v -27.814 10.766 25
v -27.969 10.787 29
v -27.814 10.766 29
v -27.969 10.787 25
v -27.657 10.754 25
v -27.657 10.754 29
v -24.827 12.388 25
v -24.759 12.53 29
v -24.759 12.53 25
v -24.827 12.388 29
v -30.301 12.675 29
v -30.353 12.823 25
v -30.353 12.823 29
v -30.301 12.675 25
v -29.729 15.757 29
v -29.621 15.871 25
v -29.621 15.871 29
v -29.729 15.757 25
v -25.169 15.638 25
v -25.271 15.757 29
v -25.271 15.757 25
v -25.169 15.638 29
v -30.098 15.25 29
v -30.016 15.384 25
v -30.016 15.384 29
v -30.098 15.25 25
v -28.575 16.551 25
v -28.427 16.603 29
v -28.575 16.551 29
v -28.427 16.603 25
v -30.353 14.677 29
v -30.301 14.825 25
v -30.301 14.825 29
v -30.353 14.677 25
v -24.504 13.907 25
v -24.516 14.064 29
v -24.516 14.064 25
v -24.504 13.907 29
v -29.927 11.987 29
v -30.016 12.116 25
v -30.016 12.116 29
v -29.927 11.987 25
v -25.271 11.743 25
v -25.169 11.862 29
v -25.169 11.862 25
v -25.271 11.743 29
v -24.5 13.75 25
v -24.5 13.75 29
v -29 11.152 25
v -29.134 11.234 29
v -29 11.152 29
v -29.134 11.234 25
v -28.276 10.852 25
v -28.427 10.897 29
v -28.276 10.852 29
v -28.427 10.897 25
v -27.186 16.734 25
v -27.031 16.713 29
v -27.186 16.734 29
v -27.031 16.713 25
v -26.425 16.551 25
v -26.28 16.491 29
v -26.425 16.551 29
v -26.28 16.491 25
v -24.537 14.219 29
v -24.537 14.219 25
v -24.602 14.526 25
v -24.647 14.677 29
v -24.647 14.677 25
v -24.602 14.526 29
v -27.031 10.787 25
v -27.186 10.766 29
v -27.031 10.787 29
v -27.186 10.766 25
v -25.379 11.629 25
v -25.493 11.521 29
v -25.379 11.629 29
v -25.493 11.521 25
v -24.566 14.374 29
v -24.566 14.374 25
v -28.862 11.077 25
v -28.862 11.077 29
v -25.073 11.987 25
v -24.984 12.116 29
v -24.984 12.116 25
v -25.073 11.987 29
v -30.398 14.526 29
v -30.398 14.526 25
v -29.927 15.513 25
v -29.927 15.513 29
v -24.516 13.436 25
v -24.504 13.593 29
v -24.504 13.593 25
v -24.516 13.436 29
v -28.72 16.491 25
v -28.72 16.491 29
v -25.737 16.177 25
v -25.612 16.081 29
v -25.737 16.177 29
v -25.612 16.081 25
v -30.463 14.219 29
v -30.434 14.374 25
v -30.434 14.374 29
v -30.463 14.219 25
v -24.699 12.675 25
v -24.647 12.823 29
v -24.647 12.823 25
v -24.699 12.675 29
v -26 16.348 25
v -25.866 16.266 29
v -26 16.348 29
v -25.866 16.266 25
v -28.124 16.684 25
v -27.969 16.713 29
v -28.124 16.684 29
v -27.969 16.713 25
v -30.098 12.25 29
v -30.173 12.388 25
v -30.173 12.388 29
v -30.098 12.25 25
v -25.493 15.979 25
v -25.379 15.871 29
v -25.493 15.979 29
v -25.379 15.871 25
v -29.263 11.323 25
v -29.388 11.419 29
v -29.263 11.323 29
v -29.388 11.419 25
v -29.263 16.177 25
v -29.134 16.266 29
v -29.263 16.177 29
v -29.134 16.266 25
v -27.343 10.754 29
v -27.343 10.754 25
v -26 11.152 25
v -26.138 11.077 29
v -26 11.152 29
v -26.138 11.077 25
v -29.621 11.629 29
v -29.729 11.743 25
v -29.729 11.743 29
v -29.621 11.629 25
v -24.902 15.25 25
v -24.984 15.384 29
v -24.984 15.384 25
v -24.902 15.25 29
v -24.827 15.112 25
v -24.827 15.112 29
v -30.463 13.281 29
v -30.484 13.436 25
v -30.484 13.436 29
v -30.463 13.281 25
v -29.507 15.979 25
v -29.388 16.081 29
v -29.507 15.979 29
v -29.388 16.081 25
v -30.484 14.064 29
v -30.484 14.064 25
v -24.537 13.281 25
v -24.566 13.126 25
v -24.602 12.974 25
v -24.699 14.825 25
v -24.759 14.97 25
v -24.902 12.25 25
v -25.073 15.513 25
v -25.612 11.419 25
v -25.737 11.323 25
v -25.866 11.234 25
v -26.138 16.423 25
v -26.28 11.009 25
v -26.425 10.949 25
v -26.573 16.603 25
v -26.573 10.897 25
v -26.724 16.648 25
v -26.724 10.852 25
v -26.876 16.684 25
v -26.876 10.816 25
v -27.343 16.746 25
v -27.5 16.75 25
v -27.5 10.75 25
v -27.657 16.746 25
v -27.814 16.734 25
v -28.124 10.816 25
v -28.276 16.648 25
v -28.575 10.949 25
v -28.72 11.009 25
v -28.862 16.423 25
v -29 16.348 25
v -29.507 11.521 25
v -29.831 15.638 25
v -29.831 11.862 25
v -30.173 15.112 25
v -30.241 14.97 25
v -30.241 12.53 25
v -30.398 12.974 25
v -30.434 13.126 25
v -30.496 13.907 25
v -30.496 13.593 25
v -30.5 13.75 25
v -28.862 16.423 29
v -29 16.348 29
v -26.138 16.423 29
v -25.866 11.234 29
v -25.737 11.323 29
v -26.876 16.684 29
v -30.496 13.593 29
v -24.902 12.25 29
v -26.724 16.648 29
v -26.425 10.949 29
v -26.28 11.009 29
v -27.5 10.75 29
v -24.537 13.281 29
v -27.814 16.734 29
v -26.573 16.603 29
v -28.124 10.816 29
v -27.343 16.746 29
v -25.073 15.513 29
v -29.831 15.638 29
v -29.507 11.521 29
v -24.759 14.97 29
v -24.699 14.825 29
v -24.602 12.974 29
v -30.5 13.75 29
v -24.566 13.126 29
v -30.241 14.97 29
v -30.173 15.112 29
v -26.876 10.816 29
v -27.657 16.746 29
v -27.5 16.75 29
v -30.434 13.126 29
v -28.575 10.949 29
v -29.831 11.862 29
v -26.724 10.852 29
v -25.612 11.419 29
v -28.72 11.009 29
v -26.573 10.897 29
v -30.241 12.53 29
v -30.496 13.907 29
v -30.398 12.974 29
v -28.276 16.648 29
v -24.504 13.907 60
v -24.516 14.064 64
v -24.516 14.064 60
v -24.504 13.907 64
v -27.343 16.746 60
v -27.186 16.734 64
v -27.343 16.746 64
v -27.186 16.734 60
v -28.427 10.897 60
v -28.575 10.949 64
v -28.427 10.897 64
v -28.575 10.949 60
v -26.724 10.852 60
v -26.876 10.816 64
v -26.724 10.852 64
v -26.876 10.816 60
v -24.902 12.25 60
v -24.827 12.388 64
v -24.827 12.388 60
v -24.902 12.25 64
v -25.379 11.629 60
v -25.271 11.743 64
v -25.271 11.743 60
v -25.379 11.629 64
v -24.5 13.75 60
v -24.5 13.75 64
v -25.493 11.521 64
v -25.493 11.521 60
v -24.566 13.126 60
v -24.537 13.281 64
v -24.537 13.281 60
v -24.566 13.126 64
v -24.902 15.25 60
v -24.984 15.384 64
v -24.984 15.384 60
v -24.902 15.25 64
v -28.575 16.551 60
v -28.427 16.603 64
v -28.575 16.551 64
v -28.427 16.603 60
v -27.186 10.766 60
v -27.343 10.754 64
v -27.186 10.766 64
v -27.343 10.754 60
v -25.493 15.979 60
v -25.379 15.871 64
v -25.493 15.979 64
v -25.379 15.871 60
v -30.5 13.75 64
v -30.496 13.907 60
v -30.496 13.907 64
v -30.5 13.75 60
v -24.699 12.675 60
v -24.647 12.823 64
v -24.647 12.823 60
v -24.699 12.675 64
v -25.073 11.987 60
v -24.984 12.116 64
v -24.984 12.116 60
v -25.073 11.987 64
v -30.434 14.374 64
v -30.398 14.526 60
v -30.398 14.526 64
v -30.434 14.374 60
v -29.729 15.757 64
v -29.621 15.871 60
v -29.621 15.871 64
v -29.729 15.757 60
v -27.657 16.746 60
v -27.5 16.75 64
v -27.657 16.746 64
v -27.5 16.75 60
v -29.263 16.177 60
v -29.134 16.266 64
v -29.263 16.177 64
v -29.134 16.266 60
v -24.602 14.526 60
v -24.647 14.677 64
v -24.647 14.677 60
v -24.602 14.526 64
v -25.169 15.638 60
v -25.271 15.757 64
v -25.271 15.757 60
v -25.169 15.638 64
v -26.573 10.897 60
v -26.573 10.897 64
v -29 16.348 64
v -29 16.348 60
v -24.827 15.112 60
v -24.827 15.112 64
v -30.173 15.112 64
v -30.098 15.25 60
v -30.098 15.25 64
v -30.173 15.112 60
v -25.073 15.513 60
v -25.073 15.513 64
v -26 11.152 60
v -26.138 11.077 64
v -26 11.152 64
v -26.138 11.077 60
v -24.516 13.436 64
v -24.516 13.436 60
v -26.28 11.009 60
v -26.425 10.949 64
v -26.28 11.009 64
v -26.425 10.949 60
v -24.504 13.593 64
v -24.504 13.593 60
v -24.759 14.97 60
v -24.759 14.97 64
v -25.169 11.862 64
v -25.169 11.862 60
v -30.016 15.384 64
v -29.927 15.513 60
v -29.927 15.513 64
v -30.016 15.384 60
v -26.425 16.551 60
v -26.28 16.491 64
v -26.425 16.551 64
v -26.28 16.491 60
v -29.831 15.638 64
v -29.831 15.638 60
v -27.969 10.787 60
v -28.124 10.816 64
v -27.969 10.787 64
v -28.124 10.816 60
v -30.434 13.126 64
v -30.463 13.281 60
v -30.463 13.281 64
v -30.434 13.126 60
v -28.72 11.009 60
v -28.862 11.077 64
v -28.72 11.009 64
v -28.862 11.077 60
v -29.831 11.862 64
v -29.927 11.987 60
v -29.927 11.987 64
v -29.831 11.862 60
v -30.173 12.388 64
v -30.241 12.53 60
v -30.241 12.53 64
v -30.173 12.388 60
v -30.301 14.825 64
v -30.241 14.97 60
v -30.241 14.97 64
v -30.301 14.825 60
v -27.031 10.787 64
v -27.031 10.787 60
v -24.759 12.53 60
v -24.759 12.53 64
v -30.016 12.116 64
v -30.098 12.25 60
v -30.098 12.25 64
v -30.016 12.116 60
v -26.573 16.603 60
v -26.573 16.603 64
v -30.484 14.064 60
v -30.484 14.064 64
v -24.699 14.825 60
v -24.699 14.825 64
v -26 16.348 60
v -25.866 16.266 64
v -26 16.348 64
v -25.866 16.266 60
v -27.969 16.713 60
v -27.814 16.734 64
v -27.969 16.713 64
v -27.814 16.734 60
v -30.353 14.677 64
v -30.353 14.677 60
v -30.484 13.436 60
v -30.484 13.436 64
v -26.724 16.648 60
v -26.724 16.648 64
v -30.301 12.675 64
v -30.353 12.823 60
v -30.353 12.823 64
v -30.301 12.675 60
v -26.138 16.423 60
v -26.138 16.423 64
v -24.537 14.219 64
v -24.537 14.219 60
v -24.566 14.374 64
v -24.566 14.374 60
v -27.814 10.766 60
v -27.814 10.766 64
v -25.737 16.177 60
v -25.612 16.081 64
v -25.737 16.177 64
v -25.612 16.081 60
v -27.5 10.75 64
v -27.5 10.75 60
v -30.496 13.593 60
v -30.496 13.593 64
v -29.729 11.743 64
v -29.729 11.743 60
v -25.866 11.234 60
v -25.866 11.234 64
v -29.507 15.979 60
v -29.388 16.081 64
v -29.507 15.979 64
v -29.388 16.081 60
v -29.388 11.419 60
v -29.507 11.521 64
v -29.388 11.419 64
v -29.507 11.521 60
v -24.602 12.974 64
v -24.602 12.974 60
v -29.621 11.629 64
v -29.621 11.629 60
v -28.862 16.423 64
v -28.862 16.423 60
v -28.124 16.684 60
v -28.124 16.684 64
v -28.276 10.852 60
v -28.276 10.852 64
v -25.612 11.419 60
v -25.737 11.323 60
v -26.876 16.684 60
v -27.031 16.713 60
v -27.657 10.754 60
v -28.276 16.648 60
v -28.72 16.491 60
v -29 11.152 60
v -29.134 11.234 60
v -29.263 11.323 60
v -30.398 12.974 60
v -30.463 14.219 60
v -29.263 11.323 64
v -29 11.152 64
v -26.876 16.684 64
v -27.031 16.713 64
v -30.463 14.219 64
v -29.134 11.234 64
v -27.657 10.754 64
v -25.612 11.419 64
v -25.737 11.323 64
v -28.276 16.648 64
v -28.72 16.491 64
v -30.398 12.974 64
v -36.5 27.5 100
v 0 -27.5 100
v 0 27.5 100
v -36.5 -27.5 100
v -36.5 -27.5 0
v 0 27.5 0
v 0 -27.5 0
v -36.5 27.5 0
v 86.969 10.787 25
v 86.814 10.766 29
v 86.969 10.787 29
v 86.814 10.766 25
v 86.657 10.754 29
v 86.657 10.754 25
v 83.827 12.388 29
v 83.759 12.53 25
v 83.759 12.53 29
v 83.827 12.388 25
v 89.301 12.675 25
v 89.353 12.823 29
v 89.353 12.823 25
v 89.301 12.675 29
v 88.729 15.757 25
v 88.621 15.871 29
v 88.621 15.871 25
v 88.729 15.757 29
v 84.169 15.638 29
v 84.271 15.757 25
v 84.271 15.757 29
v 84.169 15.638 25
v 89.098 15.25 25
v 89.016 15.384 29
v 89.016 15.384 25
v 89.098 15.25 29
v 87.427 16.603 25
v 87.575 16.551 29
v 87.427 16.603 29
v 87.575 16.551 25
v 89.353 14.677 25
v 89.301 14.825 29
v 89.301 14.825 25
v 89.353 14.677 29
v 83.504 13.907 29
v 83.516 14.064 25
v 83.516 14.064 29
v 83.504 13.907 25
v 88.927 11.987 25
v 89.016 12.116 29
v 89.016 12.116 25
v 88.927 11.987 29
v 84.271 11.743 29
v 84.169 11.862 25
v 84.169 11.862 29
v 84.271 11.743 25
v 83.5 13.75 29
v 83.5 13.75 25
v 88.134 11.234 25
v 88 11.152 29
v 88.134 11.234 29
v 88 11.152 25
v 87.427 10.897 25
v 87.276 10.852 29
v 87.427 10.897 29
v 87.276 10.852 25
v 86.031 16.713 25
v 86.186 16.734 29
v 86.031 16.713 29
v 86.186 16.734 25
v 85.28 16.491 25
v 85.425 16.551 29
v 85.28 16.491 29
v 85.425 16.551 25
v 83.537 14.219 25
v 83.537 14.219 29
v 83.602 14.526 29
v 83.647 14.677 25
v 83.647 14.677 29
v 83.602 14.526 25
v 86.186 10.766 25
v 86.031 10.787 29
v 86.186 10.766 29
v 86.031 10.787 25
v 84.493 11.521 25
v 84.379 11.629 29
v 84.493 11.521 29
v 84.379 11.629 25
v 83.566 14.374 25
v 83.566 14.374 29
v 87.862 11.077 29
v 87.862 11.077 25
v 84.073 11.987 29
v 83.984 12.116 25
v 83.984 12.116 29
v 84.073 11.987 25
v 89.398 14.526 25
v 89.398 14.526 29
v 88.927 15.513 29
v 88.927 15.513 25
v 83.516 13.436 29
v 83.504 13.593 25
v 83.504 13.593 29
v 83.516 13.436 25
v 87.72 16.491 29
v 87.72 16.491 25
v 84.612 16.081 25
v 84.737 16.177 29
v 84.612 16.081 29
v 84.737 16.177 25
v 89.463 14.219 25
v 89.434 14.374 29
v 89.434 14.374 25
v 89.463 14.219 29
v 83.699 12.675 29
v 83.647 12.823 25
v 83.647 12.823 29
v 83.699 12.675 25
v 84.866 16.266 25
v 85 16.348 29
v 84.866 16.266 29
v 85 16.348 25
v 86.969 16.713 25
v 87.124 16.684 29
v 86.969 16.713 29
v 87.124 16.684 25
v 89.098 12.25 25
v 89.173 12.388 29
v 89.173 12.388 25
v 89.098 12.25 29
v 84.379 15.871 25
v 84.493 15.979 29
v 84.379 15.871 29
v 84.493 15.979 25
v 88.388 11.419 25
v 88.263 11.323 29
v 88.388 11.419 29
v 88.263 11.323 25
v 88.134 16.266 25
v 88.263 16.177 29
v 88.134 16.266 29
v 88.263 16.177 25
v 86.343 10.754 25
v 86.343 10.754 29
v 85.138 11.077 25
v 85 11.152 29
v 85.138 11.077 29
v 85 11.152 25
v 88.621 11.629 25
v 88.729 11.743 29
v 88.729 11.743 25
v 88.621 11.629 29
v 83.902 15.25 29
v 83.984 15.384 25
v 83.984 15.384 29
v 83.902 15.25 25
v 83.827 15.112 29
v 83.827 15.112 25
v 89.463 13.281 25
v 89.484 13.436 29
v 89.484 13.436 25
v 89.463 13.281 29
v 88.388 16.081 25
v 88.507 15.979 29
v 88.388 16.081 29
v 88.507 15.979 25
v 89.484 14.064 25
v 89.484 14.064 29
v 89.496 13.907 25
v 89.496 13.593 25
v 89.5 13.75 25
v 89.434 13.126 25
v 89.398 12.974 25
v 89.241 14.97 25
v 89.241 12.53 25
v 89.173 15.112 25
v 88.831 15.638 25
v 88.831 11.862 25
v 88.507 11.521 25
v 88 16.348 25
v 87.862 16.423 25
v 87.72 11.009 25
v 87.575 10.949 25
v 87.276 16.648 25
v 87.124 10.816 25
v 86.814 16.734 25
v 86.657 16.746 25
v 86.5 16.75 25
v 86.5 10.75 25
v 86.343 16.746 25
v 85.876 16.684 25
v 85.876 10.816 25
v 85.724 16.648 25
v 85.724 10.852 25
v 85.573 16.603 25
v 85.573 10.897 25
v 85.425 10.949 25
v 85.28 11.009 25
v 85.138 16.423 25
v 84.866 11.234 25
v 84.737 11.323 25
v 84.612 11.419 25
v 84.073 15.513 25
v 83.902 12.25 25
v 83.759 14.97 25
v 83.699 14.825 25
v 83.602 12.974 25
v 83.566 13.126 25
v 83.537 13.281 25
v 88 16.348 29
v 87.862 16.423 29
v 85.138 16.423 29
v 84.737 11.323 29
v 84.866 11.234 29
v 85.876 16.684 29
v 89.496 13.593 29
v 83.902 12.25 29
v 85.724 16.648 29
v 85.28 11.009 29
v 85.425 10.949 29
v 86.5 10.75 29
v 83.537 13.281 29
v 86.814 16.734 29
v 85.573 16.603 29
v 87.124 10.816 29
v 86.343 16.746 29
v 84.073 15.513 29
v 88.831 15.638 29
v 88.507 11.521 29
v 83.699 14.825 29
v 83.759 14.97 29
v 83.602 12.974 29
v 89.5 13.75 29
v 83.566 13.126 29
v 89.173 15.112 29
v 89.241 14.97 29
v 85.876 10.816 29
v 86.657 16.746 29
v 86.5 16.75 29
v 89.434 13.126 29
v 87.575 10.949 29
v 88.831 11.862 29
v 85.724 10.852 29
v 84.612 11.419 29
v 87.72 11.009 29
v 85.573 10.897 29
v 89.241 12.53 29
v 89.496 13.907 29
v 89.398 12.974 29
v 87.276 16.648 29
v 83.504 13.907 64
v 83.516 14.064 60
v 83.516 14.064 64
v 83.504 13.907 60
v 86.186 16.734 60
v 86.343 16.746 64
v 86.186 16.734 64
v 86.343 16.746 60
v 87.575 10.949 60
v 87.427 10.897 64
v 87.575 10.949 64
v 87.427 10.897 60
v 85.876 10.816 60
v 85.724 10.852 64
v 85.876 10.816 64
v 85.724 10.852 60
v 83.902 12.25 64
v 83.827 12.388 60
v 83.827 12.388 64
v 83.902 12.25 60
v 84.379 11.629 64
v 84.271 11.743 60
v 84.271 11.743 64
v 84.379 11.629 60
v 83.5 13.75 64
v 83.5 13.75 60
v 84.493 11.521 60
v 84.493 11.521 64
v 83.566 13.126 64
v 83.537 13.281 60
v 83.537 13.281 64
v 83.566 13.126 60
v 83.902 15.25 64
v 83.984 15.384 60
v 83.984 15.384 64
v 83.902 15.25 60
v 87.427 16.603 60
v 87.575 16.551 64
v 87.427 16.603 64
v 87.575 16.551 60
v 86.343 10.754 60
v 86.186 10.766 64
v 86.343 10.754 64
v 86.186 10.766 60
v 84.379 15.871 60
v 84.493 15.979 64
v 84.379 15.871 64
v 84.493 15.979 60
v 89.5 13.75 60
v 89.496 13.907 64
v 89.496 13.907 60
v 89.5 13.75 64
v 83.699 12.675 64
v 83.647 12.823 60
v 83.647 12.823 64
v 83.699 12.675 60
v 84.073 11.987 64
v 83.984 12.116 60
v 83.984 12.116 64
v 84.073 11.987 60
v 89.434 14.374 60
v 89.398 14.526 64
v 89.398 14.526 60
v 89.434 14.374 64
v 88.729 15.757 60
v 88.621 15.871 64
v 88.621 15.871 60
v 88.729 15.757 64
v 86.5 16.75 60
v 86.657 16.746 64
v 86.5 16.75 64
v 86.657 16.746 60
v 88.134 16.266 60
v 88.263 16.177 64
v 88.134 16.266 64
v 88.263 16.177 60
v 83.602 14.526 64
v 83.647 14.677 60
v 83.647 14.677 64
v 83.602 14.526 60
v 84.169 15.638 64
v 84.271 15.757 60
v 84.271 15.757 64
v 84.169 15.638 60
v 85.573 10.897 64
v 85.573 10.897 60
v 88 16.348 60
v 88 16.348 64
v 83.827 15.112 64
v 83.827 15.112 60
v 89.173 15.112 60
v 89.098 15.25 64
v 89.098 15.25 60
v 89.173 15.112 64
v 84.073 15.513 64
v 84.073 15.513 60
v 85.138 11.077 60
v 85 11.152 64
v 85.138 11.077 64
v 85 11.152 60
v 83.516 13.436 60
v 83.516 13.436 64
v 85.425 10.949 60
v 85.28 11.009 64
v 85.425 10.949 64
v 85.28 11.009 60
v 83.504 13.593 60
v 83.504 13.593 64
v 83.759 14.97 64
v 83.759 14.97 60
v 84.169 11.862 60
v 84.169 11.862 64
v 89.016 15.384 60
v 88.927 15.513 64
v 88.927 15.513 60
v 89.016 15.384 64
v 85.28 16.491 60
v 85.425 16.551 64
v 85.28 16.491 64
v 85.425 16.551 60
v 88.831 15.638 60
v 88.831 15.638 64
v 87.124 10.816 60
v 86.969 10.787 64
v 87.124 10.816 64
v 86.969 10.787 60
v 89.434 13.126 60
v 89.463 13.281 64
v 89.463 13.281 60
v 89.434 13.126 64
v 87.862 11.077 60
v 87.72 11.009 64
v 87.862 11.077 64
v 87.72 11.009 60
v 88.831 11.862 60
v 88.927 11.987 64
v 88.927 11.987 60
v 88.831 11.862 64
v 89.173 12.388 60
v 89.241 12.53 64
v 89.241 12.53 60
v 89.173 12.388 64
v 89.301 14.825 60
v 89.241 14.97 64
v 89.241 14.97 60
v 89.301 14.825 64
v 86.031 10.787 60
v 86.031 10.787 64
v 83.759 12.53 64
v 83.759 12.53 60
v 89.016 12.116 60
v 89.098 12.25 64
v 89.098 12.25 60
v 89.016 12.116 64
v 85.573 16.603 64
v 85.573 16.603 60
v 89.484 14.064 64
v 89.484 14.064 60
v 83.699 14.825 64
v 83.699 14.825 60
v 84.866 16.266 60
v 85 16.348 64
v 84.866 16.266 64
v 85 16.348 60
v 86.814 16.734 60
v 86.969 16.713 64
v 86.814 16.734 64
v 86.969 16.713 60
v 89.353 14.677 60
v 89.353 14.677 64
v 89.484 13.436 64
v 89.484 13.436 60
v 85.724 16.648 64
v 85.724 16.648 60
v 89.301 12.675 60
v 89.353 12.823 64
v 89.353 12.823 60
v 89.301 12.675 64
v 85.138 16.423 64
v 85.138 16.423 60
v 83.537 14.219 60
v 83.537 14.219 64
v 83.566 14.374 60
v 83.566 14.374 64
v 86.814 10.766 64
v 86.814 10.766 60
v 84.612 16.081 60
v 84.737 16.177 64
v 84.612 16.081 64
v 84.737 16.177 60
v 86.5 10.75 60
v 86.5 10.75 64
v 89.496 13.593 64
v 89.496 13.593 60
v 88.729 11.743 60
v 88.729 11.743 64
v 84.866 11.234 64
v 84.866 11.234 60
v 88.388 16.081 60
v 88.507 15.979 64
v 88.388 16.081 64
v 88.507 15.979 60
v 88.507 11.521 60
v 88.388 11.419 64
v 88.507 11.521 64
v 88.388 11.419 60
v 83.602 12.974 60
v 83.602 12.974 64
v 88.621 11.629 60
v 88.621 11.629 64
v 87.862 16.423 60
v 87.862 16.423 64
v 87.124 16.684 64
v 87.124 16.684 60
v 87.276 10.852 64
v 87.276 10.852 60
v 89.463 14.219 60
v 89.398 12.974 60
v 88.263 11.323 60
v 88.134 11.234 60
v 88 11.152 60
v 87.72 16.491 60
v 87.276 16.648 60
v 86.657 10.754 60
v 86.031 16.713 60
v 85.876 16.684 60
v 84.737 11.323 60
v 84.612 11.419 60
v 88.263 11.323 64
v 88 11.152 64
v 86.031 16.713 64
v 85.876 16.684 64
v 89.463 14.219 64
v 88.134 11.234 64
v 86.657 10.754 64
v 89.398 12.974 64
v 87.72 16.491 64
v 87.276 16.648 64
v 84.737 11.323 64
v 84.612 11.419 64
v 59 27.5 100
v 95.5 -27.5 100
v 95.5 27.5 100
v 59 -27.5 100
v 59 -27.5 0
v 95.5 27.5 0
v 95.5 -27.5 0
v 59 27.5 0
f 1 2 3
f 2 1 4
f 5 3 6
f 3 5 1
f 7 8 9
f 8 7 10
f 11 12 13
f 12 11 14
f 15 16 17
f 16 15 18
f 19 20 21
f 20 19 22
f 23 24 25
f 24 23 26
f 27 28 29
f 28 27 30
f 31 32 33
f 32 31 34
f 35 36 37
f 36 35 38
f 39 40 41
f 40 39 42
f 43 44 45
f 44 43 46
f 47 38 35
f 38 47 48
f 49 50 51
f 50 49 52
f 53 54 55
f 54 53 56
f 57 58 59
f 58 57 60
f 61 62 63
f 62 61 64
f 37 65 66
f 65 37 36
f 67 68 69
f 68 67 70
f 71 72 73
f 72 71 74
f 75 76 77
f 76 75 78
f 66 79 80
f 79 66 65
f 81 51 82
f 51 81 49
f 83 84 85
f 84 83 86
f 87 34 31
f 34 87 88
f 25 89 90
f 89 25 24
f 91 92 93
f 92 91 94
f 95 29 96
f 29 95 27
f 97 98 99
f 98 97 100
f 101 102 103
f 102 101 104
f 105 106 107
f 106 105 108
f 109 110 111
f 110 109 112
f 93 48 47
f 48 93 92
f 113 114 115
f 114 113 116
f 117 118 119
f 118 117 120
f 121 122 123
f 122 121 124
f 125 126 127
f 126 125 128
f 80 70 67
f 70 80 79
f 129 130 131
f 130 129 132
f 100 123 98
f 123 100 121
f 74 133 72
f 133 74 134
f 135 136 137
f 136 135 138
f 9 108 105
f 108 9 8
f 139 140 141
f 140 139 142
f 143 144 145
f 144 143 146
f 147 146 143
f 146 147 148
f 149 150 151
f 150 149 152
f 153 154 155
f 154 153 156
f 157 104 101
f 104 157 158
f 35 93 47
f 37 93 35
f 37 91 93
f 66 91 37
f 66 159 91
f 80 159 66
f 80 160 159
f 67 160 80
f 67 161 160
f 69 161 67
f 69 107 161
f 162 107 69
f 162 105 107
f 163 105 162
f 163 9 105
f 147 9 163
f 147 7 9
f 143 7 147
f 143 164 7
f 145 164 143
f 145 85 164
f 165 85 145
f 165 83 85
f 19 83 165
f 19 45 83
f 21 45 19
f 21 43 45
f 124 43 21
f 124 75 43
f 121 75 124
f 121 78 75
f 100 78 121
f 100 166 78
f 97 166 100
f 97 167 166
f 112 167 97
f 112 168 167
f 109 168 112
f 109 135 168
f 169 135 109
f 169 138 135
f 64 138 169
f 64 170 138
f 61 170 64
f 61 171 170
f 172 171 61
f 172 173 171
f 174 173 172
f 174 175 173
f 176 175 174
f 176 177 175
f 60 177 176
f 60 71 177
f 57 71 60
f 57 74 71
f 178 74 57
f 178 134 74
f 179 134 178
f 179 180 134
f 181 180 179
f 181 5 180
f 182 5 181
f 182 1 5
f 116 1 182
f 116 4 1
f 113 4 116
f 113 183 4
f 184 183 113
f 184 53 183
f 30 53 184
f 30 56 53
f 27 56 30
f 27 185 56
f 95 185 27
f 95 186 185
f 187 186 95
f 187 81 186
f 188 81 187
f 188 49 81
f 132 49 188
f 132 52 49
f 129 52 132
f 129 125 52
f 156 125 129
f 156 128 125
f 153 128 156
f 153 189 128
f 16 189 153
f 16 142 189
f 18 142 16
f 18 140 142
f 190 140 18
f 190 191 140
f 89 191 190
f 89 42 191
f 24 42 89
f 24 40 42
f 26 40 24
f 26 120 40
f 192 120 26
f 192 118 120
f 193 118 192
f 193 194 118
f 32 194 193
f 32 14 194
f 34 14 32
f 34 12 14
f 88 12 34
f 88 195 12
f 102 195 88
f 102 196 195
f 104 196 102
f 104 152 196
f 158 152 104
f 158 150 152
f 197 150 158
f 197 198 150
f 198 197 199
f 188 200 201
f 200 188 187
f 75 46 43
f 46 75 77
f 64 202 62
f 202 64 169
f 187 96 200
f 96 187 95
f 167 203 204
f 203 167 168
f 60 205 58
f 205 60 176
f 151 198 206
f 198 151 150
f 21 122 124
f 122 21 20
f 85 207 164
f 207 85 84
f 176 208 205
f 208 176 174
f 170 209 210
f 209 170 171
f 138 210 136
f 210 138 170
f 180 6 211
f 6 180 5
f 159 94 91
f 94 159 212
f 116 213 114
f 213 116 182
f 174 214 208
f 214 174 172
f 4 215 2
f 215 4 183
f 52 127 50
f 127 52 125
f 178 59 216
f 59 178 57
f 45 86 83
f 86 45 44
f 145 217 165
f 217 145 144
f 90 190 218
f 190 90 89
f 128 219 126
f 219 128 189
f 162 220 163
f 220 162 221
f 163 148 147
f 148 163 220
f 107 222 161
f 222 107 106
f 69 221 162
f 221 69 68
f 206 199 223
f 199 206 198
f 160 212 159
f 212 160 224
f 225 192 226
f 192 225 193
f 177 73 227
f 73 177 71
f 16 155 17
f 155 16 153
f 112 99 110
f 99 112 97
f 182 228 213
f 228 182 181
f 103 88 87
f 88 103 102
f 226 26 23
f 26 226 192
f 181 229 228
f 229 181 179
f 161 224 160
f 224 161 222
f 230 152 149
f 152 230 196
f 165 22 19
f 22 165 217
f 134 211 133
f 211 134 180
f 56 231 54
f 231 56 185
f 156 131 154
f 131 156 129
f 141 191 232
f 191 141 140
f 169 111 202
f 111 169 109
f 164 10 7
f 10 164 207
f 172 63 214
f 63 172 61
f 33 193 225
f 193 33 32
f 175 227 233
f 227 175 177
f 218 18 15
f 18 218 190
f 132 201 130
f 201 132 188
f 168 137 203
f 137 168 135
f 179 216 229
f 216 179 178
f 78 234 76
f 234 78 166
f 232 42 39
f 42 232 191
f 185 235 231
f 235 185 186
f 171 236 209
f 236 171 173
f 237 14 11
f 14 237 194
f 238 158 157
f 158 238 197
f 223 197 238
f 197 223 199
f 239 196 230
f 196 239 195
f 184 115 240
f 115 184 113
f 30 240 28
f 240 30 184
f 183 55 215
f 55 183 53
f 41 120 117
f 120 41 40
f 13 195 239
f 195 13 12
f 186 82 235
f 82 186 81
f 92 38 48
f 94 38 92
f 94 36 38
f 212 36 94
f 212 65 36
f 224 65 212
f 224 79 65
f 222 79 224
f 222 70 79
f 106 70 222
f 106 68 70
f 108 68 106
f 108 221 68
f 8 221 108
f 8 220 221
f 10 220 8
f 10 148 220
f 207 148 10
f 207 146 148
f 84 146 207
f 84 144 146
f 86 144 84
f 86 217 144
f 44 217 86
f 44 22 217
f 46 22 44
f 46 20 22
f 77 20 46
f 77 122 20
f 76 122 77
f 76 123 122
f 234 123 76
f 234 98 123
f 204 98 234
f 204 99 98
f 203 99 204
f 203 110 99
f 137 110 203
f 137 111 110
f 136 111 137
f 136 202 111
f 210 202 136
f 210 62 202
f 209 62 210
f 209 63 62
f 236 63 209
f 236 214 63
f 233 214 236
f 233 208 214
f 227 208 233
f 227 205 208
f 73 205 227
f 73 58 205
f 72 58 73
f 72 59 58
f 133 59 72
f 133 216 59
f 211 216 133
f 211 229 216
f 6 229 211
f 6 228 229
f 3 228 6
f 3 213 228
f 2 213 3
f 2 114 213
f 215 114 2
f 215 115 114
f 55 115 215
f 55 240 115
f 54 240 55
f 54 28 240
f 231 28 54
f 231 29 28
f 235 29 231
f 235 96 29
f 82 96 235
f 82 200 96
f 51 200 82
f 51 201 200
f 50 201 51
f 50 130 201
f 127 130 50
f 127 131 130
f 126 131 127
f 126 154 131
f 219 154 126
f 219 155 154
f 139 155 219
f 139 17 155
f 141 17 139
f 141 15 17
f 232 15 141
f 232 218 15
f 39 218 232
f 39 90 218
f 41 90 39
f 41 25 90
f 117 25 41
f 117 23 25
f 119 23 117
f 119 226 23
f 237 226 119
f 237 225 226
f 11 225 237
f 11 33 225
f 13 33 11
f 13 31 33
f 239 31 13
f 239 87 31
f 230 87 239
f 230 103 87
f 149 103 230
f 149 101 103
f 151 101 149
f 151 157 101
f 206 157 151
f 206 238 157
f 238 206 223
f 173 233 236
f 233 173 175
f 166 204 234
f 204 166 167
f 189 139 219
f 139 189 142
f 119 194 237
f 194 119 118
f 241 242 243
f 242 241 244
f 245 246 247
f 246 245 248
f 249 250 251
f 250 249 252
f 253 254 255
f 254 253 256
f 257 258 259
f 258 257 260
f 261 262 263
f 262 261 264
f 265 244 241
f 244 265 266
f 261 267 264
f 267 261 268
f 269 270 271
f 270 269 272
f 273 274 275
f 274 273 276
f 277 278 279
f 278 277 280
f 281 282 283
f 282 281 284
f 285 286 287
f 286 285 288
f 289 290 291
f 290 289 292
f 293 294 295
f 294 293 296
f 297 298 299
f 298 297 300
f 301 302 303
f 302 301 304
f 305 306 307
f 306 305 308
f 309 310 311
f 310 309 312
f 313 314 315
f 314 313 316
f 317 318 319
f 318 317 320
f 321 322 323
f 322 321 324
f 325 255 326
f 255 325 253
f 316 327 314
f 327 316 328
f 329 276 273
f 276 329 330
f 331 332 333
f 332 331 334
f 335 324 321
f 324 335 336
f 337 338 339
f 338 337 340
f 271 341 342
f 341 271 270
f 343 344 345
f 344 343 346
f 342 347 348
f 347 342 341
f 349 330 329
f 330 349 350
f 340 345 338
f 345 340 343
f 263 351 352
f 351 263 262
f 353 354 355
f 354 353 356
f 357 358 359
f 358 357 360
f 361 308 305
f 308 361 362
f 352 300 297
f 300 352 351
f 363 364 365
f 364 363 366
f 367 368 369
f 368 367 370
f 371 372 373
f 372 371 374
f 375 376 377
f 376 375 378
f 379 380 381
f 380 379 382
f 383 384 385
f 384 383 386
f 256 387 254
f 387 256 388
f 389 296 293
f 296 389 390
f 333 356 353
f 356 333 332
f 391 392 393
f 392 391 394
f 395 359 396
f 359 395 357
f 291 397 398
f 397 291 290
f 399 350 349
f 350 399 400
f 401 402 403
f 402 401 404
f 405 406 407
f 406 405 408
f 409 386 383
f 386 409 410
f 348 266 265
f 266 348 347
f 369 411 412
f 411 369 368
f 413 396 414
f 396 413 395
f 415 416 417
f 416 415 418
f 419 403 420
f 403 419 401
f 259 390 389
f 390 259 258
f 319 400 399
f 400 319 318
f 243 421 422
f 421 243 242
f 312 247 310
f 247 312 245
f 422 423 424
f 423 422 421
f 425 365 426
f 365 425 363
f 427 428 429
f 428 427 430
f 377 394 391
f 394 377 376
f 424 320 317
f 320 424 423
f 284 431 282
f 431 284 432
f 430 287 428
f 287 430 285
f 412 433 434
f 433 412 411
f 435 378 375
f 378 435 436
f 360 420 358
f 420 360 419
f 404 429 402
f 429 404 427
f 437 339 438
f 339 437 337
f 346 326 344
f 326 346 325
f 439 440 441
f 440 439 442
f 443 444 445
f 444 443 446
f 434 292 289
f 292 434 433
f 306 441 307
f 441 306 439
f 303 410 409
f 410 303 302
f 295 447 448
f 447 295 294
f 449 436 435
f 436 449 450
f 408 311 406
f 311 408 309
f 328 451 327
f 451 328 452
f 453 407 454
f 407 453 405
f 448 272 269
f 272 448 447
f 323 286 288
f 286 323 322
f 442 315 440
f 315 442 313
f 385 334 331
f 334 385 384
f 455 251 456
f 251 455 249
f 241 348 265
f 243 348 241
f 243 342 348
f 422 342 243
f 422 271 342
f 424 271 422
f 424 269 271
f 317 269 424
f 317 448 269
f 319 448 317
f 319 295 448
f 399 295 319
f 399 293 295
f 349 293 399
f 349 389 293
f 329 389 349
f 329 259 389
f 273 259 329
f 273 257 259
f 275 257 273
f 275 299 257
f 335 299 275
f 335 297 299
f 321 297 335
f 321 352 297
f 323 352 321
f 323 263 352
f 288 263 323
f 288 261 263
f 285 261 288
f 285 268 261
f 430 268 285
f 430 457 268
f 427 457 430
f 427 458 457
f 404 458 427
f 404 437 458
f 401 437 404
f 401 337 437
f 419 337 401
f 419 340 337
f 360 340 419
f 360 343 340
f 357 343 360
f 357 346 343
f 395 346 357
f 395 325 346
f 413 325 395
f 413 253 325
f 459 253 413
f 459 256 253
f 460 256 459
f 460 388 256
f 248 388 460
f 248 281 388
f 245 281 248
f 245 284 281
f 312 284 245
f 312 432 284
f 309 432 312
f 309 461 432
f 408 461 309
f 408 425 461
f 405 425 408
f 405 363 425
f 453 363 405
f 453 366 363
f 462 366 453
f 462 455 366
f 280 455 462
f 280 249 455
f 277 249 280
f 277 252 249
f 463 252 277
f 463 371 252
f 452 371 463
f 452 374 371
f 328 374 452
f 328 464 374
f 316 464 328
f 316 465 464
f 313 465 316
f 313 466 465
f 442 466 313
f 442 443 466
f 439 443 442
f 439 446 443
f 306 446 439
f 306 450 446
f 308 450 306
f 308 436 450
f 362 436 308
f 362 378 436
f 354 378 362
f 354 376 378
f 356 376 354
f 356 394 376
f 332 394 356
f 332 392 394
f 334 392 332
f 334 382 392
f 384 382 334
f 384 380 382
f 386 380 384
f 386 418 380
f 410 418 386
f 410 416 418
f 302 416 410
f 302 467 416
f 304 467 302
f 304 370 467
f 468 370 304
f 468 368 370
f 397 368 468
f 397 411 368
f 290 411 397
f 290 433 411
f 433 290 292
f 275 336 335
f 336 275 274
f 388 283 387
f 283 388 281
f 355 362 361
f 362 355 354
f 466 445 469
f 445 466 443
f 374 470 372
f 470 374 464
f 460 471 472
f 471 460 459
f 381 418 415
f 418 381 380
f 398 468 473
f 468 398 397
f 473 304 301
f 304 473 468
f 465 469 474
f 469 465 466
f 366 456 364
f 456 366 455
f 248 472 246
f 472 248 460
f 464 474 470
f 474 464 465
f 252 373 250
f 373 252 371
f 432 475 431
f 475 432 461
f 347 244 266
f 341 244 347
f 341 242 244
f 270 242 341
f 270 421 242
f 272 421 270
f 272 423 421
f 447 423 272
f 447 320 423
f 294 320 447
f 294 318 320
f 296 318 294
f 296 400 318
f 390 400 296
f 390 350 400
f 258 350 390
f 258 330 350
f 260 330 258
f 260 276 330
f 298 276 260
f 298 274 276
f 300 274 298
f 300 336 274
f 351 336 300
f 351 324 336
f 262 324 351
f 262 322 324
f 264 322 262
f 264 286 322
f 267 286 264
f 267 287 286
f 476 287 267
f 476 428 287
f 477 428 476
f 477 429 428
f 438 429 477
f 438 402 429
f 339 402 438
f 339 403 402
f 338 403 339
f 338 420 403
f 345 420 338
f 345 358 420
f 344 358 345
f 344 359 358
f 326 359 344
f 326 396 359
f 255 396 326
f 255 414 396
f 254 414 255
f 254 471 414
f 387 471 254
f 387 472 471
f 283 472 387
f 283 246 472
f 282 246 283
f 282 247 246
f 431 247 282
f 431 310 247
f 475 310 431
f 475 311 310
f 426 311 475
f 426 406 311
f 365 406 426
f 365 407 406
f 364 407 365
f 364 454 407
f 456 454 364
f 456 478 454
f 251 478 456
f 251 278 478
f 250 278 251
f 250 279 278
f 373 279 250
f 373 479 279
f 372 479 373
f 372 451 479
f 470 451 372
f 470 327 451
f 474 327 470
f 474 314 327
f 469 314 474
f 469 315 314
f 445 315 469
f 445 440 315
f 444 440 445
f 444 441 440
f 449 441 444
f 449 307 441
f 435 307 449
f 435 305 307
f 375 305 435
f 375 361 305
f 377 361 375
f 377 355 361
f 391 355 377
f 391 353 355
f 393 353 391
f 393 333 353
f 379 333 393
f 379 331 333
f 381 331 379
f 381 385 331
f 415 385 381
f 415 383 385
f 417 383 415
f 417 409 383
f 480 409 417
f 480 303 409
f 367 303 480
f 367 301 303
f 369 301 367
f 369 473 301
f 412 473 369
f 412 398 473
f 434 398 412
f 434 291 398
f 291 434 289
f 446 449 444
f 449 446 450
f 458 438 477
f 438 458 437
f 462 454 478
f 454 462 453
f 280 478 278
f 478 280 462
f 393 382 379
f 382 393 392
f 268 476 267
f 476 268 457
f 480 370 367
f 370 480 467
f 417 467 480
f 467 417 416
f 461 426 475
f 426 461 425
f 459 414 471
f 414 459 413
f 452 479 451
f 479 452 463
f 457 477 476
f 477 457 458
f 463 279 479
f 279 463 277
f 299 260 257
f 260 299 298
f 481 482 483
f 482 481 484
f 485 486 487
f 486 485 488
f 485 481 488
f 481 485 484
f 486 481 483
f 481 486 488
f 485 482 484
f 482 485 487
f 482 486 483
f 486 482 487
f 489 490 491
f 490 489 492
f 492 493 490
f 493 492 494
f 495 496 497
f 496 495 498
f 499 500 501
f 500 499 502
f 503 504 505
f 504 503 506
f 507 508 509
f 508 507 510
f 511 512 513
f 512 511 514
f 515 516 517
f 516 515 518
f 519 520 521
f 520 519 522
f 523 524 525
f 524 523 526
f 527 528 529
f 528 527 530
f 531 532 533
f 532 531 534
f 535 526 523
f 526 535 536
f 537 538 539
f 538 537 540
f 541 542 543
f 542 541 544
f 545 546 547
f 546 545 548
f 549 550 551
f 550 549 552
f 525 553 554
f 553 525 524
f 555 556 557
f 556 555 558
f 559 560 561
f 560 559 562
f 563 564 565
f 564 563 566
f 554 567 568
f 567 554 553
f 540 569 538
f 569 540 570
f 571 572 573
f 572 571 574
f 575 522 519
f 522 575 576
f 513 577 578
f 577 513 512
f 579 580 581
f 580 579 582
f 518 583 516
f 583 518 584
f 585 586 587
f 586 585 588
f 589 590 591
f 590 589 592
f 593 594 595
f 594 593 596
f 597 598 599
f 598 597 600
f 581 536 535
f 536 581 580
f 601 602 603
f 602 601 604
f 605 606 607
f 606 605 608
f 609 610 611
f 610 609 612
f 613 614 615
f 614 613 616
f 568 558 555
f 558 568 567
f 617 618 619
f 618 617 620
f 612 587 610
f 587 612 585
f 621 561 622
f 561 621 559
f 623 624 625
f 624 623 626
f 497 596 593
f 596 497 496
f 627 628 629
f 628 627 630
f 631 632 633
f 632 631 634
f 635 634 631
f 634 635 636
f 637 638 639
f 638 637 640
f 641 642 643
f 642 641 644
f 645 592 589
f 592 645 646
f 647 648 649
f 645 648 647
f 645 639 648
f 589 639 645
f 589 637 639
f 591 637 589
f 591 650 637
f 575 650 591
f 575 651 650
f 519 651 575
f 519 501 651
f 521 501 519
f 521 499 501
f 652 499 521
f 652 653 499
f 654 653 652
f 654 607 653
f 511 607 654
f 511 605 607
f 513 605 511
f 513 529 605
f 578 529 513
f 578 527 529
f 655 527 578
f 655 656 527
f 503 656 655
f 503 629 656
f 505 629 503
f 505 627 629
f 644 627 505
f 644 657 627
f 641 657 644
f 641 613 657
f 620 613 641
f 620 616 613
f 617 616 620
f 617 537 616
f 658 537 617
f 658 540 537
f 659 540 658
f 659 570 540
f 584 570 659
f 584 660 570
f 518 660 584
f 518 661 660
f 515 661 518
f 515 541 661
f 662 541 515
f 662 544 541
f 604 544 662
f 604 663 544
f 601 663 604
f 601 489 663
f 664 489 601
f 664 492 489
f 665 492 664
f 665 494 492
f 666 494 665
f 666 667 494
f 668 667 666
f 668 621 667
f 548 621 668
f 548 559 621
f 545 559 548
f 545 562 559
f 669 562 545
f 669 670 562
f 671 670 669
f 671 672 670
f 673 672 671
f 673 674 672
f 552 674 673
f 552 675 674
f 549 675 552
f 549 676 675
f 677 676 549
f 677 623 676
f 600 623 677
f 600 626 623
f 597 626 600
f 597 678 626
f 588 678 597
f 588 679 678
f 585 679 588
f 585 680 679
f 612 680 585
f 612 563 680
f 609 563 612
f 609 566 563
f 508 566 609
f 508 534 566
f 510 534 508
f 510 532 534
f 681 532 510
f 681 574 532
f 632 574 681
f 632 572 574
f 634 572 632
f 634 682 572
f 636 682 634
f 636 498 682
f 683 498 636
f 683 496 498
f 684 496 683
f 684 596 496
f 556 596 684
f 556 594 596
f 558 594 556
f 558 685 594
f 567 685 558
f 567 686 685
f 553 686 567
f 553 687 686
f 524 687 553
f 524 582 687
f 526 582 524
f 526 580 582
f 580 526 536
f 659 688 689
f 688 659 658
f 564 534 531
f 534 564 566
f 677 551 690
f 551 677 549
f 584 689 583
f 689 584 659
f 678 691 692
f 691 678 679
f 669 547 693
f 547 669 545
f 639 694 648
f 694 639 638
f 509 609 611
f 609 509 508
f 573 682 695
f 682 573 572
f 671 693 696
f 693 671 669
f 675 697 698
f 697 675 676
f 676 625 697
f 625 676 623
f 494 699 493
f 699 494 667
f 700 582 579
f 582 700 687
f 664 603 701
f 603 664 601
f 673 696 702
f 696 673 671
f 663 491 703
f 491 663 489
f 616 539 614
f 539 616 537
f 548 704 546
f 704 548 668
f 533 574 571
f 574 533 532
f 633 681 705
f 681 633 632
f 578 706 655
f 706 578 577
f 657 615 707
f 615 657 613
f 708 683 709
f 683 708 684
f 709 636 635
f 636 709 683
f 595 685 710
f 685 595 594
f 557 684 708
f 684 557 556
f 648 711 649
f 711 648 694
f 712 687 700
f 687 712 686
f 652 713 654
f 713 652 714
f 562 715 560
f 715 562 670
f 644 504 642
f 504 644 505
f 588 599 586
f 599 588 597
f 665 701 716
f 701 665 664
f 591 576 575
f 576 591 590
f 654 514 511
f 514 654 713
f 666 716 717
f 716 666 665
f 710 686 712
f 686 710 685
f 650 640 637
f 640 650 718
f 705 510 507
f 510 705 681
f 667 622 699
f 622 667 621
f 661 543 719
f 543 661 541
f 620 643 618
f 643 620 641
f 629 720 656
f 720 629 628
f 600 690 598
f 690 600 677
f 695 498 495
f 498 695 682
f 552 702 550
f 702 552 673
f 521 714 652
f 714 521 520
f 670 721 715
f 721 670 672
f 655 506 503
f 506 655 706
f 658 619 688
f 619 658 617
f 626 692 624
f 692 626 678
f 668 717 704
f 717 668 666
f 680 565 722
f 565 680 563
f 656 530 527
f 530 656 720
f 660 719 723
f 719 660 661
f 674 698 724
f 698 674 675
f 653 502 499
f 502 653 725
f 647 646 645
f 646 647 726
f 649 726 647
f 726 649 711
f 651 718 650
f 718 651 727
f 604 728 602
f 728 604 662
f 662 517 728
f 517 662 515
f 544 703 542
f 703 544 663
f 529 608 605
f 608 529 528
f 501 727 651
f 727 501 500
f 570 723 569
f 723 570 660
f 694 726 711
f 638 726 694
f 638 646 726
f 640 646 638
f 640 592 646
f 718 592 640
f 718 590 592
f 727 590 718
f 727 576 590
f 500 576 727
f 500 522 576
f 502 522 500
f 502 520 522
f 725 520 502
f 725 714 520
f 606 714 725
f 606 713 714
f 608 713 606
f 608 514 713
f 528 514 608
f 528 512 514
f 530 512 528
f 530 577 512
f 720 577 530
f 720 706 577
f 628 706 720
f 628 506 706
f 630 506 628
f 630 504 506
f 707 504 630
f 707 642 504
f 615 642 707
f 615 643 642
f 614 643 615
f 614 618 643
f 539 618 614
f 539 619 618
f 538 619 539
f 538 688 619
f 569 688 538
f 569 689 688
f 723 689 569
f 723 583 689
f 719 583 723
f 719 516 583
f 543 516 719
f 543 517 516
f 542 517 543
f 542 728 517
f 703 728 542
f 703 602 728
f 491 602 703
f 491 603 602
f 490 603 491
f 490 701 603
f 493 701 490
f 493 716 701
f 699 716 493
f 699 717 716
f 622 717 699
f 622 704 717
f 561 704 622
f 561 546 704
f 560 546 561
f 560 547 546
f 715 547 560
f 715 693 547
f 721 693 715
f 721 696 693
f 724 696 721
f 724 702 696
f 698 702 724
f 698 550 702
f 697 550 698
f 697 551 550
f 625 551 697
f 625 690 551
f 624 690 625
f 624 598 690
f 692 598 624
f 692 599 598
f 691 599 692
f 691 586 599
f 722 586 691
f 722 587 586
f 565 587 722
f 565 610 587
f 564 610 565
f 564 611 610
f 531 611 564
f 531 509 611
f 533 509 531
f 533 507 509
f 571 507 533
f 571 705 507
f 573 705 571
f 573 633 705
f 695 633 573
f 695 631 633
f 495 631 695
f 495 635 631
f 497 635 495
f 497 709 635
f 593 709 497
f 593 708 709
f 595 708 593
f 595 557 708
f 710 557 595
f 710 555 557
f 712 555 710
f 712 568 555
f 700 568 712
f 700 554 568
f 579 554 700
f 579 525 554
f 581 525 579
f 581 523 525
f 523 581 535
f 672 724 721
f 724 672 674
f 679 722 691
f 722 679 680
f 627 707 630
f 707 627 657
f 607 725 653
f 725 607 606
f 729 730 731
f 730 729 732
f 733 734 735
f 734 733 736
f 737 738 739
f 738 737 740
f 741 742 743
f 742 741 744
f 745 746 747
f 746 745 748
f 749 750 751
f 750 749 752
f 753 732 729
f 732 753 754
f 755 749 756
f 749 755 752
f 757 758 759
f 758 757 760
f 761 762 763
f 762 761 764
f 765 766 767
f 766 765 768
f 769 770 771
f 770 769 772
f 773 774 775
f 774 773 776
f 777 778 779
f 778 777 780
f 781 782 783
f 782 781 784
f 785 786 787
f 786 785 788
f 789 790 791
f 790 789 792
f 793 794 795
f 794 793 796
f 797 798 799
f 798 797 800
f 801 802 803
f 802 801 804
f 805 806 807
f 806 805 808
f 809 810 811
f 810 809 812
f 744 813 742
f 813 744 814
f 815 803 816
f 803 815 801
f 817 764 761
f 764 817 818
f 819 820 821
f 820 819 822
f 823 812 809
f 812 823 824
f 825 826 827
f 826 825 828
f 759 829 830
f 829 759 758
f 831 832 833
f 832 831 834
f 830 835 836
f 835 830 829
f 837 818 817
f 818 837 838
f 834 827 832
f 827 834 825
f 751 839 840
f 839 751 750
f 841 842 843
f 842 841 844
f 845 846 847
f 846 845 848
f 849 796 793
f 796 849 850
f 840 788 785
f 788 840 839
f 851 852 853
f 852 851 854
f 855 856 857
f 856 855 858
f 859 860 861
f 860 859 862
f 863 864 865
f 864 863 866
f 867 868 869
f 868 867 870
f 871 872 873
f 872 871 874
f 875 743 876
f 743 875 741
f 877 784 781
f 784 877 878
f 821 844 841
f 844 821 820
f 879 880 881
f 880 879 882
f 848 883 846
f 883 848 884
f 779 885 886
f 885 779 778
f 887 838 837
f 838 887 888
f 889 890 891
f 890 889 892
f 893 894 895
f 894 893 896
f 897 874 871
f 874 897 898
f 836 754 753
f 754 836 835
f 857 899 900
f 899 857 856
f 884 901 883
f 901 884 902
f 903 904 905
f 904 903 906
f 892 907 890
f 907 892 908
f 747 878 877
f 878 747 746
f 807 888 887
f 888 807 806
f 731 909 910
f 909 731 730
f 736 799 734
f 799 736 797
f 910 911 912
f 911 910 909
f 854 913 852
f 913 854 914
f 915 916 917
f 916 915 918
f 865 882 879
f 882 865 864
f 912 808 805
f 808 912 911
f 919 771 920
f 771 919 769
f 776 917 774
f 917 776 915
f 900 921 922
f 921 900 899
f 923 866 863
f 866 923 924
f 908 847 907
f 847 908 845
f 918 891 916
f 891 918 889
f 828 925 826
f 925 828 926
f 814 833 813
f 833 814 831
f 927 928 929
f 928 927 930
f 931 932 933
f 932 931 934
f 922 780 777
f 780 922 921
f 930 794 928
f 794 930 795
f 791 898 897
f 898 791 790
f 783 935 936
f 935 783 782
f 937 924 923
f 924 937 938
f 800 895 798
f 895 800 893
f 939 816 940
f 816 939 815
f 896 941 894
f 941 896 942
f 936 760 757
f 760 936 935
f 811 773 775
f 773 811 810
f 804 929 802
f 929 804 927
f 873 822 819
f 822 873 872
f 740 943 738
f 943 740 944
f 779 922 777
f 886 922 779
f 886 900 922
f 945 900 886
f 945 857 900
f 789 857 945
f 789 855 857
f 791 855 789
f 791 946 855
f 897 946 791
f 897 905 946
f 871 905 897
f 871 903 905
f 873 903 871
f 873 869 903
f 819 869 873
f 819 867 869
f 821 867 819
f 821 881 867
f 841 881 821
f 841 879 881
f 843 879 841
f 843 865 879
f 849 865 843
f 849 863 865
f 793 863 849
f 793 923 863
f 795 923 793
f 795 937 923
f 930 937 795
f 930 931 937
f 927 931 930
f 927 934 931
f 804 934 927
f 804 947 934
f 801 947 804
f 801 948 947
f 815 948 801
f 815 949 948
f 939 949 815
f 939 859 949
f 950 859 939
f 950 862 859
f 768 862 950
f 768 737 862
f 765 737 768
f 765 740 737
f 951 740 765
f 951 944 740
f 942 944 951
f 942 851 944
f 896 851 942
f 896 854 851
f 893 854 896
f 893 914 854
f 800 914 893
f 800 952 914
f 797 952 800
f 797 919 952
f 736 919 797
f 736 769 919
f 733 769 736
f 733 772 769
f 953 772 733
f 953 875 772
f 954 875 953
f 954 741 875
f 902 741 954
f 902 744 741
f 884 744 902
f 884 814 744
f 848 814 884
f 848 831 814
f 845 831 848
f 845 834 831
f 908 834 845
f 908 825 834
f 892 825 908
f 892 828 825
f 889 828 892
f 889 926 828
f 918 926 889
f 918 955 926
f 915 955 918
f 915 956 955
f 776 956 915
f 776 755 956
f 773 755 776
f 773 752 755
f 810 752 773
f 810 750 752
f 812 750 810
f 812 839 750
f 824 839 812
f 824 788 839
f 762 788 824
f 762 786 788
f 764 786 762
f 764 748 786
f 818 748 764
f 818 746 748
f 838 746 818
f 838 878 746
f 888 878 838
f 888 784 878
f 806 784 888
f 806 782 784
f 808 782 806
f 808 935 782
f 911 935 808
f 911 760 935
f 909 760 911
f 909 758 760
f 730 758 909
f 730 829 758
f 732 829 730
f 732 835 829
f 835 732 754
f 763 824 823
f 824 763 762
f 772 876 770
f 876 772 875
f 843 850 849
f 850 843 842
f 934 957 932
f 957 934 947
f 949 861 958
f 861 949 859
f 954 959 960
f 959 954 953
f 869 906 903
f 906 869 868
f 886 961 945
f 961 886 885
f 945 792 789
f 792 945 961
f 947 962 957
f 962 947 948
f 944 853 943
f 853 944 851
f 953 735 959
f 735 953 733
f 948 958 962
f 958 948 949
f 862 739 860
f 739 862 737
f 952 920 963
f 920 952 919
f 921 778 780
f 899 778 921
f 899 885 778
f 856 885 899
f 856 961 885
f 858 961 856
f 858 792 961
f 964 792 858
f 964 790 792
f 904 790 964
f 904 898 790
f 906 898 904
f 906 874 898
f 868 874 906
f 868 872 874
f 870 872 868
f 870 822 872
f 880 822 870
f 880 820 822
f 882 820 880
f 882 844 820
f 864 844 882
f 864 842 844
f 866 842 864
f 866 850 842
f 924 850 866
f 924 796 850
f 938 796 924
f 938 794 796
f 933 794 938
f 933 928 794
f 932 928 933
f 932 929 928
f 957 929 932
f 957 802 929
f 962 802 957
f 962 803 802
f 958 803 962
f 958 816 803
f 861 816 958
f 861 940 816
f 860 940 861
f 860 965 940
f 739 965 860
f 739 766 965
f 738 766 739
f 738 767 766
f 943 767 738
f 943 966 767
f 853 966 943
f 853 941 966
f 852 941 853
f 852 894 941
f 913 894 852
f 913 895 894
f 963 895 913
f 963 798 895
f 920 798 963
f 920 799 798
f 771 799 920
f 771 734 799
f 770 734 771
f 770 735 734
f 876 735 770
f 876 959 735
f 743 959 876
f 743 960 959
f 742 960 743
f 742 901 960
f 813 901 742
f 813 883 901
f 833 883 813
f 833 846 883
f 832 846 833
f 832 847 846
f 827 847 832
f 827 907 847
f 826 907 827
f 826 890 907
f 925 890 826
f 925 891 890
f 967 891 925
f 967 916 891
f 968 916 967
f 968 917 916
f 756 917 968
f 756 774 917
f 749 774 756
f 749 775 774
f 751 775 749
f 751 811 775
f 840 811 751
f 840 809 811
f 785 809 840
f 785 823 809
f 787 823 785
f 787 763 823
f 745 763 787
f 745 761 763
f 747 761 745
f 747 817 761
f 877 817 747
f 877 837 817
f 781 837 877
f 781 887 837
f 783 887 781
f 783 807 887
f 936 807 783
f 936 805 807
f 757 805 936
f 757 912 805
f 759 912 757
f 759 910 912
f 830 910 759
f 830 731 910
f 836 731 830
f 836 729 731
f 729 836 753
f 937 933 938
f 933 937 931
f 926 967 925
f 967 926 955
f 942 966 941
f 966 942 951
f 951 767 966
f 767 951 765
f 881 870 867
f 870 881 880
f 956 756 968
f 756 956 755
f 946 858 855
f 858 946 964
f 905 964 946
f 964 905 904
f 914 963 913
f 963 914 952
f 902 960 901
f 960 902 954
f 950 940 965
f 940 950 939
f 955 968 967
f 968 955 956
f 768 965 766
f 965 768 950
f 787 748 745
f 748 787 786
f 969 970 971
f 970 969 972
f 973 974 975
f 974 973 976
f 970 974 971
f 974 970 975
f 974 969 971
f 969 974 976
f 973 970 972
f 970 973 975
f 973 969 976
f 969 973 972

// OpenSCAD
// Teardrop Candle Mold (2-part)
// Community share – Christmas edition 🎄
// Units: millimeters

$fn = 120;

// -------- Parameters --------
candle_height = 90;
max_width = 55;
wall_thickness = 4;
mold_thickness = 18;
wick_hole_dia = 2.5;
alignment_pin_dia = 6;
alignment_pin_depth = 4;

// -------- Teardrop Shape --------
module teardrop() {
    scale([1,1,1.2])
    rotate_extrude()
    translate([max_width/4,0,0])
    circle(r=max_width/4);
}

// -------- Candle Core --------
module candle_core() {
    difference() {
        teardrop();
        // Wick hole
        translate([0,0,candle_height-5])
            cylinder(h=20, d=wick_hole_dia, center=false);
    }
}

// -------- Mold Half --------
module mold_half(mirror_side=false) {
    mirror(mirror_side ? [1,0,0] : [0,0,0])
    difference() {
        // Outer mold block
        translate([-max_width/2 - mold_thickness/2, -max_width/2, 0])
        cube([max_width + mold_thickness, max_width, candle_height + 10]);

        // Candle cavity
        translate([0,0,5])
            candle_core();

        // Split cut
        translate([0,-max_width,0])
            cube([max_width, max_width*2, candle_height+20]);

        // Alignment pin holes
        for (z=[25,60]) {
            translate([-max_width/2, max_width/4, z])
                cylinder(h=alignment_pin_depth, d=alignment_pin_dia);
        }
    }
}

// -------- Assembly View --------
mold_half(false);
translate([max_width + 4,0,0])
    mold_half(true);
